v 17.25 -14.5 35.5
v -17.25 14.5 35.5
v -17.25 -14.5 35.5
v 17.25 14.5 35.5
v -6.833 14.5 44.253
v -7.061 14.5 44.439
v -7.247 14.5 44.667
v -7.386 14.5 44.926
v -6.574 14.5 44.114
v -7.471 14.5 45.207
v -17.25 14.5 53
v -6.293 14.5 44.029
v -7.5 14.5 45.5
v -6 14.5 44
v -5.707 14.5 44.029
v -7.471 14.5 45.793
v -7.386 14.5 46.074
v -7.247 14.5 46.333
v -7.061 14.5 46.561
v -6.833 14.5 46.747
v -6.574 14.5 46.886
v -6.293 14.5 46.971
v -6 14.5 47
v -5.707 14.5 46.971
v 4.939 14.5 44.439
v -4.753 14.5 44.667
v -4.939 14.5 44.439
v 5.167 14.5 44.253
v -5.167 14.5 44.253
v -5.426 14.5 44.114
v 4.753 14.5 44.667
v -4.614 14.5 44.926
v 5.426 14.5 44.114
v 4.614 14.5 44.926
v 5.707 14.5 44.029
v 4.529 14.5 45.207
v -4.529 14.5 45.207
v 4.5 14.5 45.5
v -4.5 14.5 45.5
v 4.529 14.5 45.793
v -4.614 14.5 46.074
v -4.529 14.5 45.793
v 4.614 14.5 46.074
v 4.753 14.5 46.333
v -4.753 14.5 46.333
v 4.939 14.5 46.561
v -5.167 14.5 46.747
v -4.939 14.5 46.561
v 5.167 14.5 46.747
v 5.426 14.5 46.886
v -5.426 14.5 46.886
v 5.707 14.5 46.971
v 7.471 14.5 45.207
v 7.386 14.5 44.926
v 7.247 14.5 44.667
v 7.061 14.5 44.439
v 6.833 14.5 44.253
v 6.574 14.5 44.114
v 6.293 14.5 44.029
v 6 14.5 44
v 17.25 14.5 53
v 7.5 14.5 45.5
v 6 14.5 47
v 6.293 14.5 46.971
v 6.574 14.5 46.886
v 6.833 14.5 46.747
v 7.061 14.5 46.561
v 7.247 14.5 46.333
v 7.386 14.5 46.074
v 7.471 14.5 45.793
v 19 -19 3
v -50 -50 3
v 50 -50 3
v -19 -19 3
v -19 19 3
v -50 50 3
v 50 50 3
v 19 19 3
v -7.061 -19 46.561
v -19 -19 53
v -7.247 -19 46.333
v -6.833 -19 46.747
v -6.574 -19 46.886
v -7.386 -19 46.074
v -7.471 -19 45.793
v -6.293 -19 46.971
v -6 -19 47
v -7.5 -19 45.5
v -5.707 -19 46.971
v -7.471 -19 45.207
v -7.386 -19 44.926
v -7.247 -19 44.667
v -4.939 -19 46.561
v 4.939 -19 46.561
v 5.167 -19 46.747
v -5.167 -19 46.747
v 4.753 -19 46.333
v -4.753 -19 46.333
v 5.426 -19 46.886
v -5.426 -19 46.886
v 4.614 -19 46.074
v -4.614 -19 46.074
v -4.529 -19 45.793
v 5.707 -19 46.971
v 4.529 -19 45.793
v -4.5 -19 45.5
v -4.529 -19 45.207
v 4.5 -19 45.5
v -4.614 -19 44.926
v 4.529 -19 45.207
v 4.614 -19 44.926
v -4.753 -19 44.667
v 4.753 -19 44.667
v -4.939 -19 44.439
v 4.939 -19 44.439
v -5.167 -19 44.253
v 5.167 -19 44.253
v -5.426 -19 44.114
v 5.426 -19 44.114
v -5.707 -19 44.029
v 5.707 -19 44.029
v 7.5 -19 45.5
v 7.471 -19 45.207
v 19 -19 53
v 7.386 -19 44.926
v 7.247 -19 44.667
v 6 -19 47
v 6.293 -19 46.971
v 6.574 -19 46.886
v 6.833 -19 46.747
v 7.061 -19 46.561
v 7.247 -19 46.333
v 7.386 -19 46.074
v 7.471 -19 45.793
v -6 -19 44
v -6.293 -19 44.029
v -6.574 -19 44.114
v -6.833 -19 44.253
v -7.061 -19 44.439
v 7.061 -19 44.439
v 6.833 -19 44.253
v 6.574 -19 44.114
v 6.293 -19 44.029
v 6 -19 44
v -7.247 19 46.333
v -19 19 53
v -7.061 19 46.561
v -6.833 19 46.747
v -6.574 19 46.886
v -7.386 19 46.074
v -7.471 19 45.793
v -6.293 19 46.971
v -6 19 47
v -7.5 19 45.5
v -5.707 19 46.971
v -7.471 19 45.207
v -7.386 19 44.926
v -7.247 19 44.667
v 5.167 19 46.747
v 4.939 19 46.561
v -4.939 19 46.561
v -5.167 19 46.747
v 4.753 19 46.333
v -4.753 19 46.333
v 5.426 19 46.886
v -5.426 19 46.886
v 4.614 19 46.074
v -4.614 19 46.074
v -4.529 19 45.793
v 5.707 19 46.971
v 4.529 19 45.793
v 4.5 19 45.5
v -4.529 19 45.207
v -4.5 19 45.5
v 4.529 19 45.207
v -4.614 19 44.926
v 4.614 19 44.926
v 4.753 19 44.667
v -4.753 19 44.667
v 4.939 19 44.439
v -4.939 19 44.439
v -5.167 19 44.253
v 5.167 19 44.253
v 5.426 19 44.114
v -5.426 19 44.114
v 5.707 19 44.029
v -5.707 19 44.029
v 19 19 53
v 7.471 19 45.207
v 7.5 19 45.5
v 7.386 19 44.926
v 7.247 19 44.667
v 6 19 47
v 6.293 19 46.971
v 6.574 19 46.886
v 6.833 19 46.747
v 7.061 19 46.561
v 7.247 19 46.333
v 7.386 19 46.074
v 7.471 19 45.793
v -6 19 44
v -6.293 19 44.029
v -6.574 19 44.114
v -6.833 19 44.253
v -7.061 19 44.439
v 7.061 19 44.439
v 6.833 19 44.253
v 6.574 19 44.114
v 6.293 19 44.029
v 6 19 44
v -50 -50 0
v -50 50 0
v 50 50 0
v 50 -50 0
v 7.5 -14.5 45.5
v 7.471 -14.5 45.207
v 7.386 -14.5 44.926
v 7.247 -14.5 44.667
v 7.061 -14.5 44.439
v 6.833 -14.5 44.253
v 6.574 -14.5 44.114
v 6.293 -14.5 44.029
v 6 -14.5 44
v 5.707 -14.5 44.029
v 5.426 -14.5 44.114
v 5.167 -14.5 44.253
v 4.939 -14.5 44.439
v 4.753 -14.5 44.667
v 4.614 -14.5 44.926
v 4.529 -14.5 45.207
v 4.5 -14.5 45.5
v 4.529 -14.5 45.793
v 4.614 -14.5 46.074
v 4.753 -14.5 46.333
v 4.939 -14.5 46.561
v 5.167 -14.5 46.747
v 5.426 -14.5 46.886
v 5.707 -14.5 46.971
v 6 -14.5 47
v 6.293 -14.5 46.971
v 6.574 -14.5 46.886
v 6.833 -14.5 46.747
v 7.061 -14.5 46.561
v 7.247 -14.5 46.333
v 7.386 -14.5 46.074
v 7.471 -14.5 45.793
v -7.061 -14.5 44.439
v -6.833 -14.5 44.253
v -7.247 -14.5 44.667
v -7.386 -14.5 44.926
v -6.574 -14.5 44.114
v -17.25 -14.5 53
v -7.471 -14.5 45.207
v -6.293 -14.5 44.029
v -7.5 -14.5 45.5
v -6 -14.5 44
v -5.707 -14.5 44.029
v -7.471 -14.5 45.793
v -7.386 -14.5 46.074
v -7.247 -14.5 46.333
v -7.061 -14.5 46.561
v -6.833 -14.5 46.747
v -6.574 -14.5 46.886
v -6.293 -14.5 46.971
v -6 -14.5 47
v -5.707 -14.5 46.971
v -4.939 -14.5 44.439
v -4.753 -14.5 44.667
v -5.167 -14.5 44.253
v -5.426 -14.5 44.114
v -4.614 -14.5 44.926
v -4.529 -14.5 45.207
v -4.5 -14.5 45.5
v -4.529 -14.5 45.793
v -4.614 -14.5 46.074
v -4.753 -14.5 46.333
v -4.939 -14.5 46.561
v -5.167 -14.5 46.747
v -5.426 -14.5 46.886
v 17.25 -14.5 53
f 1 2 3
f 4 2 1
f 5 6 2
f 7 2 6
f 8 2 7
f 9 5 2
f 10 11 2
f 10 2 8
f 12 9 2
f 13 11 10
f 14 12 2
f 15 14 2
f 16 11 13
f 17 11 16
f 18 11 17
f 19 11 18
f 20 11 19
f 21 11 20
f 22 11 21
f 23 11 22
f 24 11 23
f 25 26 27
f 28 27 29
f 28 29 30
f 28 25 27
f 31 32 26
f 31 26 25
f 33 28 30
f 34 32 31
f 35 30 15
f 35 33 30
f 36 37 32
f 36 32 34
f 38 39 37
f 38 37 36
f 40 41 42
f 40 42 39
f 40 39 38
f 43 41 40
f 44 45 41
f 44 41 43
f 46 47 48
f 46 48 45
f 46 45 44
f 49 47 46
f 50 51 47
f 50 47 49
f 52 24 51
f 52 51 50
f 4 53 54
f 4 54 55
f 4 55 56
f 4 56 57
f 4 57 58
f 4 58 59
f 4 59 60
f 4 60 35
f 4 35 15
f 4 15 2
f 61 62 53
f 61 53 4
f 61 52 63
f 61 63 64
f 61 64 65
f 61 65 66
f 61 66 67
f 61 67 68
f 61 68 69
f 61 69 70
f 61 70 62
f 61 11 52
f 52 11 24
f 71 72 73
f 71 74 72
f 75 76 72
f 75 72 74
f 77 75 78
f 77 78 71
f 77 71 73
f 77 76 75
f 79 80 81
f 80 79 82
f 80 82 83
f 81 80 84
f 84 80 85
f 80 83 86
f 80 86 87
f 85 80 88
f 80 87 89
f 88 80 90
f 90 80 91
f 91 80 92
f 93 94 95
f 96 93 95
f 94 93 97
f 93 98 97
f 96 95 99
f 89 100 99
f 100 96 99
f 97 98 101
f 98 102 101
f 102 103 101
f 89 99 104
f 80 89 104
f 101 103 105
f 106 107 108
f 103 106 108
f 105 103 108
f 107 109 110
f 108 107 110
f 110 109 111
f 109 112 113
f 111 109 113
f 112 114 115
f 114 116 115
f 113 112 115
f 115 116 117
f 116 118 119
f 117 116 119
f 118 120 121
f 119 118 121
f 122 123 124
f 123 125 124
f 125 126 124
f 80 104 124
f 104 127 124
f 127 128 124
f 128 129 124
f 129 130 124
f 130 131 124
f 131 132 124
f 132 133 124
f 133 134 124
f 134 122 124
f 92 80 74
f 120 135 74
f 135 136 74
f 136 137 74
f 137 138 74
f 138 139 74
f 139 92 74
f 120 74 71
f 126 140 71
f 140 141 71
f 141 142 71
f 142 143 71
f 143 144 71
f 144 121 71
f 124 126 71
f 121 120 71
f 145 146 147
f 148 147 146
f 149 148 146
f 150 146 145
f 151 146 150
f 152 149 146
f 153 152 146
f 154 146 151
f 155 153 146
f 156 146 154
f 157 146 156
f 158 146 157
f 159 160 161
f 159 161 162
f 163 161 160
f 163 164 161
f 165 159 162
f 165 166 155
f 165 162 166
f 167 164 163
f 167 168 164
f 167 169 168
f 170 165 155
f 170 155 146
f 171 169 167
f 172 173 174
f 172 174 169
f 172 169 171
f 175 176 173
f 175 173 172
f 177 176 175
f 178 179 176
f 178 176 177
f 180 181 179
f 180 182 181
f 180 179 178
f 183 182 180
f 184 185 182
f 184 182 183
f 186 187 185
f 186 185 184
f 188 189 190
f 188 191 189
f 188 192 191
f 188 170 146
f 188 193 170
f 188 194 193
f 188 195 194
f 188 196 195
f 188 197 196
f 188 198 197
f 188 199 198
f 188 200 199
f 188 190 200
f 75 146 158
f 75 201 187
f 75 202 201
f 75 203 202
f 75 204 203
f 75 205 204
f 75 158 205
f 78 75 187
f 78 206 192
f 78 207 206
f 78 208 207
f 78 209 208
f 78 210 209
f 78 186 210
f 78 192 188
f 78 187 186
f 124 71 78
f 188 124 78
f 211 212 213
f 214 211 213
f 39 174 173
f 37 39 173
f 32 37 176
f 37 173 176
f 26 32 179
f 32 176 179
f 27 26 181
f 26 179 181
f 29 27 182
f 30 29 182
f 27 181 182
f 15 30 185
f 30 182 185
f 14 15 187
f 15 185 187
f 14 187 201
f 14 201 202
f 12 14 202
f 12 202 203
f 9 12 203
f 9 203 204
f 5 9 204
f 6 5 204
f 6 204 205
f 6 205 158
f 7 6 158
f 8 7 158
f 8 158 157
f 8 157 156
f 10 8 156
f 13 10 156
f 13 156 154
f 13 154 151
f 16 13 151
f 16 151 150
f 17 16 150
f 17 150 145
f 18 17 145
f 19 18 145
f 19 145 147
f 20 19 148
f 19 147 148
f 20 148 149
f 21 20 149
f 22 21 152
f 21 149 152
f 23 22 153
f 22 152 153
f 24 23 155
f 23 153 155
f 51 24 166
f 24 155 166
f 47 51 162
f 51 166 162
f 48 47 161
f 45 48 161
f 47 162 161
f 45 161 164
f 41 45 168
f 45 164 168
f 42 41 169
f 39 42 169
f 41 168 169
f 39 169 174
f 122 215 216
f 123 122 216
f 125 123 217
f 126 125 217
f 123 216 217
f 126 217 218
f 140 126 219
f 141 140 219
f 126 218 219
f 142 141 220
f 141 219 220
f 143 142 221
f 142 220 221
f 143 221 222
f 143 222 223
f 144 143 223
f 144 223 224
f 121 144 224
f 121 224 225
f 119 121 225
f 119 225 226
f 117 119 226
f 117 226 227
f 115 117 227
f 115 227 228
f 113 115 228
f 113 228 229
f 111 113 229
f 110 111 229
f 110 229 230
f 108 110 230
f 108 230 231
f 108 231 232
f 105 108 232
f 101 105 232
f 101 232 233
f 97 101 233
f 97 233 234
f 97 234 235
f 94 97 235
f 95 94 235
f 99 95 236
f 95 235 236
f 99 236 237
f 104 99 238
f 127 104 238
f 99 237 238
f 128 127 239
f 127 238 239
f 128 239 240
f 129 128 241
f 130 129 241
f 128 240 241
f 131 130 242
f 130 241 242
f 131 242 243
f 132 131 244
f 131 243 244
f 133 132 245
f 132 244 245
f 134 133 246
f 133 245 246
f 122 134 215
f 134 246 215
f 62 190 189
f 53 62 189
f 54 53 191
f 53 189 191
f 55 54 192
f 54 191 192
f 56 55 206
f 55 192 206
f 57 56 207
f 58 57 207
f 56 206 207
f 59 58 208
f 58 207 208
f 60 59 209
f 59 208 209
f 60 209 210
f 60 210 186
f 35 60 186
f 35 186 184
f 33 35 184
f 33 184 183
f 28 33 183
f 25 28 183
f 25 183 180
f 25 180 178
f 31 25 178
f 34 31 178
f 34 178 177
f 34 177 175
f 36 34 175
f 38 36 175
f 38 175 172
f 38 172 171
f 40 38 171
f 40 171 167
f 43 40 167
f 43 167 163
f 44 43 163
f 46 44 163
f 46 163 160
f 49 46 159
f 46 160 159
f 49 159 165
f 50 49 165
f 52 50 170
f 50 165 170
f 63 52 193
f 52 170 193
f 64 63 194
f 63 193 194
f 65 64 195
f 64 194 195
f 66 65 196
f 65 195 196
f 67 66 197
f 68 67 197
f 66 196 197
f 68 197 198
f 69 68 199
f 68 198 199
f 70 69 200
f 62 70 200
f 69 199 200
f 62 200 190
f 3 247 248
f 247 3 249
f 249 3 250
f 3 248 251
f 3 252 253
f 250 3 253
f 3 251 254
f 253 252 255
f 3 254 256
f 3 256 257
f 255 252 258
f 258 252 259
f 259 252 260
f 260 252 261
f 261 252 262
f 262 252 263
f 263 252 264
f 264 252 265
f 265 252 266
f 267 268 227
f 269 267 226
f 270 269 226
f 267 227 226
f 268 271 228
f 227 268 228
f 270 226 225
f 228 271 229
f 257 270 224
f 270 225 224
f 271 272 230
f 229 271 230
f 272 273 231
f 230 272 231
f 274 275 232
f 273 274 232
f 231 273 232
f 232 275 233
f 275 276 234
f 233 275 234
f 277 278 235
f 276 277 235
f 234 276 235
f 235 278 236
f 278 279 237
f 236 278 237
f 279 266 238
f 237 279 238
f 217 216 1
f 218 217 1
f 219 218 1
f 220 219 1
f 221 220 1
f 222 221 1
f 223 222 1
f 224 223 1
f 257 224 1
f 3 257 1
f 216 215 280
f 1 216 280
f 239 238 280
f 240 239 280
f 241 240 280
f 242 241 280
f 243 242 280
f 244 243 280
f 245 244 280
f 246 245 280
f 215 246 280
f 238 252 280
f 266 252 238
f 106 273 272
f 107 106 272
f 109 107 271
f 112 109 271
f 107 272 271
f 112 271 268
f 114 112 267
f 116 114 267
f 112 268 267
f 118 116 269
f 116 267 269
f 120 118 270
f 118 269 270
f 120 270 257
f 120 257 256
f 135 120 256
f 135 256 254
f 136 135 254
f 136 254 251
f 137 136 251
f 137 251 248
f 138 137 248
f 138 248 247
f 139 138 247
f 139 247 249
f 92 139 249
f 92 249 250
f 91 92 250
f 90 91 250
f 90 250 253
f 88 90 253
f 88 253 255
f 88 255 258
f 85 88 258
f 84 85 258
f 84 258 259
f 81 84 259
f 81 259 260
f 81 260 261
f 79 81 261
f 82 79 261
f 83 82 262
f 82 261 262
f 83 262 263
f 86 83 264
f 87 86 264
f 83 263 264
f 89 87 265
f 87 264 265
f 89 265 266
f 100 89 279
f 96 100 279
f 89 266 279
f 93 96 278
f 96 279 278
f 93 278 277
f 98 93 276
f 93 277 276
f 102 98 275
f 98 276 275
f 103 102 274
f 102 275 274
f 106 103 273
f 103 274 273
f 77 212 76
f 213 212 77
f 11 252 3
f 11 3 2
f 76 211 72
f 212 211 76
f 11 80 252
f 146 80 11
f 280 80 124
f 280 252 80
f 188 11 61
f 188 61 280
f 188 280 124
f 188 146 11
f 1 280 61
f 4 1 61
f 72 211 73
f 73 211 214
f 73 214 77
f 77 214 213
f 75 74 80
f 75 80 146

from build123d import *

# Parameters (mm, degrees)
SKETCH1_W           = 100
SKETCH1_H           = 100
BOSS_EXTRUDE1_DEPTH = 3
SKETCH3_W           = 38
SKETCH3_H           = 38
BOSS_EXTRUDE2_DEPTH = 50
SKETCH5_W           = 34.5
SKETCH5_H           = 29
CUT_EXTRUDE1_DEPTH  = 17.5
SKETCH6_R           = 1.5
CUT_EXTRUDE2_DEPTH  = 50


with BuildPart() as part:
    # Sketch1 → Boss-Extrude1 (new body)
    with BuildSketch(Plane.XY):
        Rectangle(SKETCH1_W, SKETCH1_H)
    extrude(amount=BOSS_EXTRUDE1_DEPTH)

    # Sketch3 → Boss-Extrude2 (add)
    with BuildSketch(Plane.XY.offset(3)):
        Rectangle(SKETCH3_W, SKETCH3_H)
    extrude(amount=BOSS_EXTRUDE2_DEPTH)

    # Sketch5 → Cut-Extrude1 (cut)
    with BuildSketch(Plane.XY.offset(53)):
        Rectangle(SKETCH5_W, SKETCH5_H)
    extrude(amount=-CUT_EXTRUDE1_DEPTH, mode=Mode.SUBTRACT)

    # Sketch6 → Cut-Extrude2 (cut)
    with BuildSketch(Plane(origin=(0, 19, 0), x_dir=(1, 0, 0), z_dir=(0, 1, 0))):
        with Locations((6, -45.5)):
            Circle(SKETCH6_R)
        with Locations((-6, -45.5)):
            Circle(SKETCH6_R)
    extrude(amount=-CUT_EXTRUDE2_DEPTH, mode=Mode.SUBTRACT)


solid = part.part
